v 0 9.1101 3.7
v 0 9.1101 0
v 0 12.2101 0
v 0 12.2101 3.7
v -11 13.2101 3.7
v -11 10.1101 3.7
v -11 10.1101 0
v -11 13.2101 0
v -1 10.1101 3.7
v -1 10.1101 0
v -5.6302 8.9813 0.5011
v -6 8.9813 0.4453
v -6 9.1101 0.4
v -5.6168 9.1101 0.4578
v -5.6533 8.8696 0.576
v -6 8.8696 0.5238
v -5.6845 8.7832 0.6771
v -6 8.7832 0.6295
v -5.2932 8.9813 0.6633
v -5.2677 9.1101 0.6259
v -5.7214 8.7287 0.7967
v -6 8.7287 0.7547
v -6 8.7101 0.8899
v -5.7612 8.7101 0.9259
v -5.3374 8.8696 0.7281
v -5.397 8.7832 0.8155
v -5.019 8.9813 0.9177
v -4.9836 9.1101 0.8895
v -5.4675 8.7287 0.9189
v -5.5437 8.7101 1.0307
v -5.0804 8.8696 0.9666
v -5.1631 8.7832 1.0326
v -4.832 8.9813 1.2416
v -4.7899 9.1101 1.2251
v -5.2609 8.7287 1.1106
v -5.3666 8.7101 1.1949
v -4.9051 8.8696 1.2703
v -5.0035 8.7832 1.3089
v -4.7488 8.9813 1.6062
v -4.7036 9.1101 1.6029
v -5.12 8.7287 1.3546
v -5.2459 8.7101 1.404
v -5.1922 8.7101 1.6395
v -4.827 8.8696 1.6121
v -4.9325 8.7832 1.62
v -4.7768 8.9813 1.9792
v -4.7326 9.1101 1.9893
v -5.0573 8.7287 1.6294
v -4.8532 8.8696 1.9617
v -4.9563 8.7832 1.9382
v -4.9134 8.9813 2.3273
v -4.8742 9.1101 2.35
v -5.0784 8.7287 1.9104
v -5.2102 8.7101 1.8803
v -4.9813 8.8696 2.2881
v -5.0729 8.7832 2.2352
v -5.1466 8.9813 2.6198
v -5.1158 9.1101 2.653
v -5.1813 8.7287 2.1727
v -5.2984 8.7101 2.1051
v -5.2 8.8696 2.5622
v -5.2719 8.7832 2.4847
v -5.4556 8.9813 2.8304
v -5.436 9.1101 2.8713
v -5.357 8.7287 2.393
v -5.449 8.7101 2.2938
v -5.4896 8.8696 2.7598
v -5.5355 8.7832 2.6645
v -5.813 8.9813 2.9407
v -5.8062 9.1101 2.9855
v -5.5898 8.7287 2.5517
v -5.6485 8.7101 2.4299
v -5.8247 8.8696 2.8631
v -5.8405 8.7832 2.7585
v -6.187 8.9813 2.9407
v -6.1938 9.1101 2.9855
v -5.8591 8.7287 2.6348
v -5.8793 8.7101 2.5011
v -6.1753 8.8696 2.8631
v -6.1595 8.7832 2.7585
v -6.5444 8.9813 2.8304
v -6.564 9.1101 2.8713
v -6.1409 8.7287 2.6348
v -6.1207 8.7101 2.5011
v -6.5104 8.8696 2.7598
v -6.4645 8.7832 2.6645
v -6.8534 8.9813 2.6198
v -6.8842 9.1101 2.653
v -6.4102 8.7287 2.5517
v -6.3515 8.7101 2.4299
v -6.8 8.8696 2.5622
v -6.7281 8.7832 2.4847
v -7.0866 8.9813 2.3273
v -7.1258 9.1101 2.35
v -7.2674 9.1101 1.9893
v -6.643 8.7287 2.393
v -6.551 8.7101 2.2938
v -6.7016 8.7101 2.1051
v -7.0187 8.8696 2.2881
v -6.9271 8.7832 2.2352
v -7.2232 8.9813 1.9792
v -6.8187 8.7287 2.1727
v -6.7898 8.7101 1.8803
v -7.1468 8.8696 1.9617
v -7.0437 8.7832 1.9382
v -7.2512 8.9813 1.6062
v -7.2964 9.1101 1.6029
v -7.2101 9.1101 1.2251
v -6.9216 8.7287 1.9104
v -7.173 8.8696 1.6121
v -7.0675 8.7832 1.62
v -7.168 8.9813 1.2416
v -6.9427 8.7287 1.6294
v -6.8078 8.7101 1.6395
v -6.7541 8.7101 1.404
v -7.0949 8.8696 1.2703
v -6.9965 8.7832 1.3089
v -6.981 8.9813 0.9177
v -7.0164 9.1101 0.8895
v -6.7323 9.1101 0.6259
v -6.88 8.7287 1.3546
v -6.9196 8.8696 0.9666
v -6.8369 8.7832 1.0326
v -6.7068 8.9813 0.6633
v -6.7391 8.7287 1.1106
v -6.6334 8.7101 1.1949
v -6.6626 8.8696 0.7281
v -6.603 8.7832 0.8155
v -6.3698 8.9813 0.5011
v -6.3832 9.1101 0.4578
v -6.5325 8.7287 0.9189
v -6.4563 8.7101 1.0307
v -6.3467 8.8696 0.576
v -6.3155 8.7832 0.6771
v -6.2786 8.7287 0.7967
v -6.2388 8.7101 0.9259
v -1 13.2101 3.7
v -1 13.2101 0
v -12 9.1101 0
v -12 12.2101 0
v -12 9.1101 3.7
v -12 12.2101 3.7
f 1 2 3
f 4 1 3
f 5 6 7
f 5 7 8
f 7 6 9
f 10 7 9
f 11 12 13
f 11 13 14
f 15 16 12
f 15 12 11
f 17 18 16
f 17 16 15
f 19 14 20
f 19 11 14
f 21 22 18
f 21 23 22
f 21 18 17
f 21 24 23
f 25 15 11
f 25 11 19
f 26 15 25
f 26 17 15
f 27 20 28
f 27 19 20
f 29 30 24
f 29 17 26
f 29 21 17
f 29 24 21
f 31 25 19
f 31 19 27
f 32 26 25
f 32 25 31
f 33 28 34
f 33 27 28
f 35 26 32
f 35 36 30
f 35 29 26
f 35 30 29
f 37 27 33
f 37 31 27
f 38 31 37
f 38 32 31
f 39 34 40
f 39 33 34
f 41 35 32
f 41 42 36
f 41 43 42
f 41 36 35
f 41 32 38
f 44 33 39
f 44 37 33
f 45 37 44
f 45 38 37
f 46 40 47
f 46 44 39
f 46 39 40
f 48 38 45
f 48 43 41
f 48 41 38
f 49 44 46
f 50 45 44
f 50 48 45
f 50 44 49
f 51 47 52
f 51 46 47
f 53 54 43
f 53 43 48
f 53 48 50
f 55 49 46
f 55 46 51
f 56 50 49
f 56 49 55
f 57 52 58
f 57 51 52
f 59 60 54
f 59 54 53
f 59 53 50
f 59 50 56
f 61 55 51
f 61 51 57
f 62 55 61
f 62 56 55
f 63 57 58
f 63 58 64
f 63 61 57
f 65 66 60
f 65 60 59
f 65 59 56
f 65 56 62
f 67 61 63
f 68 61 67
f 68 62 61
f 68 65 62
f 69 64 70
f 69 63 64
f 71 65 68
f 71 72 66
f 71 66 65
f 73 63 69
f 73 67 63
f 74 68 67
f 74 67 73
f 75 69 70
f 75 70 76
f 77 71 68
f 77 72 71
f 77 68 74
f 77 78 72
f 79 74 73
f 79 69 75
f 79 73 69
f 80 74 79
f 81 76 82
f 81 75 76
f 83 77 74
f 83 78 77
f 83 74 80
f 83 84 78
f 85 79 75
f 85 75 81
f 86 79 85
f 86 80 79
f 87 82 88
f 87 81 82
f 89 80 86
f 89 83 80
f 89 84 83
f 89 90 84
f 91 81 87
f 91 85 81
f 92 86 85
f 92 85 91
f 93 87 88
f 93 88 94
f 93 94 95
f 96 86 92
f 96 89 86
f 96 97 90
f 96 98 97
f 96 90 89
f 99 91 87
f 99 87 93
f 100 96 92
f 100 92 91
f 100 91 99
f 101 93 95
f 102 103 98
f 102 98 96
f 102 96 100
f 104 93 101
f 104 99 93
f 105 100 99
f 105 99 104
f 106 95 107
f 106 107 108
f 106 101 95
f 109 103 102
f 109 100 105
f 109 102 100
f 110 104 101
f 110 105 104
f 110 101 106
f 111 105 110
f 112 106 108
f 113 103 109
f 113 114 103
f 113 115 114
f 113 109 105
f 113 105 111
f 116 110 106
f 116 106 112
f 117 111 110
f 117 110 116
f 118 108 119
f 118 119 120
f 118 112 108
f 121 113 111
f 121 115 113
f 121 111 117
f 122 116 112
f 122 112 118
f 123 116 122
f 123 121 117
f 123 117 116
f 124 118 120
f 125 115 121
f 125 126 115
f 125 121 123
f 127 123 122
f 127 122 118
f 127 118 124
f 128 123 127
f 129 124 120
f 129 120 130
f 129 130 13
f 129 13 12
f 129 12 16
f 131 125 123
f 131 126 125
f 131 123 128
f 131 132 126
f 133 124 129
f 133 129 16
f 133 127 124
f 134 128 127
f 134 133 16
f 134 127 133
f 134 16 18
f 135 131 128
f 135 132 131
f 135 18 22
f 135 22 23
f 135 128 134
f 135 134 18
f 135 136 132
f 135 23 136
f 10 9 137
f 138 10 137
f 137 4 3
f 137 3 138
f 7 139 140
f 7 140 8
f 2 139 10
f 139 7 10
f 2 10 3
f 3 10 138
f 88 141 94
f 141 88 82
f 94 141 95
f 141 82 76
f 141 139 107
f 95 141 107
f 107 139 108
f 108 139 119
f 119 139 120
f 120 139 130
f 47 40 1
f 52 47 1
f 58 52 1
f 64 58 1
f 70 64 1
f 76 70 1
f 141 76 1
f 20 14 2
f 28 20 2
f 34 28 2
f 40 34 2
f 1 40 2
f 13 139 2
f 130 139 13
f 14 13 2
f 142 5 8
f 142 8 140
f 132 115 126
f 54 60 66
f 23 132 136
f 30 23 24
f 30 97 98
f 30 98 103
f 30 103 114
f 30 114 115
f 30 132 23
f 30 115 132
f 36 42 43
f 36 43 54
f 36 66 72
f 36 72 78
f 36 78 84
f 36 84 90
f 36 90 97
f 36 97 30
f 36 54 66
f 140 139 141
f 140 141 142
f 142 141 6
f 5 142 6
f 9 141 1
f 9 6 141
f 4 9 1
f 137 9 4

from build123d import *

# Parameters (mm, degrees)
SKETCH1_W           = 12
SKETCH1_H           = 4.1
BOSS_EXTRUDE1_DEPTH = 3.7
CUT_EXTRUDE1_DEPTH  = 3.7
CUT_EXTRUDE2_DEPTH  = 3.7
SKETCH5_R           = 1.3
BOSS_EXTRUDE2_DEPTH = 0.4
FILLET1_R           = 0.5
SKETCH6_W           = 10
SKETCH6_H           = 3.1
CUT_EXTRUDE3_DEPTH  = 19.226253597


with BuildPart() as part:
    # Sketch1 → Boss-Extrude1 (new body)
    with BuildSketch(Plane.XY):
        with Locations((-6, 11.160084034)):
            Rectangle(SKETCH1_W, SKETCH1_H)
    extrude(amount=BOSS_EXTRUDE1_DEPTH)

    # Sketch3 → Cut-Extrude1 (cut)
    with BuildSketch(Plane.XY.offset(3.7)):
        Polygon((-1, 13.210084034), (0, 13.210084034), (0, 12.210084034), align=None)
    extrude(amount=-CUT_EXTRUDE1_DEPTH, mode=Mode.SUBTRACT)

    # Sketch4 → Cut-Extrude2 (cut)
    with BuildSketch(Plane.XY.offset(3.7)):
        Polygon((-12, 13.210084034), (-11, 13.210084034), (-12, 12.210084034), align=None)
    extrude(amount=-CUT_EXTRUDE2_DEPTH, mode=Mode.SUBTRACT)

    # Sketch5 → Boss-Extrude2 (add)
    with BuildSketch(Plane.XZ.offset(-9.110084034)):
        with Locations(Location((-6, 1.7, 0), (0, 0, 270))):
            Circle(SKETCH5_R)
    extrude(amount=BOSS_EXTRUDE2_DEPTH)

    # Fillet1
    # the kernel refuses this fillet: 0.5 mm, written as the material it takes off along each edge
    with BuildSketch(Plane(origin=(-6, 8.710084034, 1.7), x_dir=(0, 0, -1), z_dir=(-1, 0, 0))) as fillet1_piece_1:
        with BuildLine():
            CenterArc((0.810102051, -0.5), FILLET1_R, 11.536959033, 78.463040967)
            Line((0.810102051, 0), (0.810102051, 0.01))
            Line((0.810102051, 0.01), (1.3, 0.01))
            Line((1.3, 0.01), (1.31, 0))
            ThreePointArc((1.31, 0), (1.31, -0.2), (1.309797959, -0.398))
            Line((1.309797959, -0.398), (1.3, -0.4))
        make_face()
    revolve(axis=Axis((-6, 8.710084034, 1.7), (0, -1, 0)), mode=Mode.SUBTRACT)

    # Sketch6 → Cut-Extrude3 (cut, through all)
    with BuildSketch(Plane.XY.offset(3.7)):
        with Locations((-6, 11.660084034)):
            Rectangle(SKETCH6_W, SKETCH6_H)
    extrude(amount=-CUT_EXTRUDE3_DEPTH, mode=Mode.SUBTRACT)


solid = part.part
